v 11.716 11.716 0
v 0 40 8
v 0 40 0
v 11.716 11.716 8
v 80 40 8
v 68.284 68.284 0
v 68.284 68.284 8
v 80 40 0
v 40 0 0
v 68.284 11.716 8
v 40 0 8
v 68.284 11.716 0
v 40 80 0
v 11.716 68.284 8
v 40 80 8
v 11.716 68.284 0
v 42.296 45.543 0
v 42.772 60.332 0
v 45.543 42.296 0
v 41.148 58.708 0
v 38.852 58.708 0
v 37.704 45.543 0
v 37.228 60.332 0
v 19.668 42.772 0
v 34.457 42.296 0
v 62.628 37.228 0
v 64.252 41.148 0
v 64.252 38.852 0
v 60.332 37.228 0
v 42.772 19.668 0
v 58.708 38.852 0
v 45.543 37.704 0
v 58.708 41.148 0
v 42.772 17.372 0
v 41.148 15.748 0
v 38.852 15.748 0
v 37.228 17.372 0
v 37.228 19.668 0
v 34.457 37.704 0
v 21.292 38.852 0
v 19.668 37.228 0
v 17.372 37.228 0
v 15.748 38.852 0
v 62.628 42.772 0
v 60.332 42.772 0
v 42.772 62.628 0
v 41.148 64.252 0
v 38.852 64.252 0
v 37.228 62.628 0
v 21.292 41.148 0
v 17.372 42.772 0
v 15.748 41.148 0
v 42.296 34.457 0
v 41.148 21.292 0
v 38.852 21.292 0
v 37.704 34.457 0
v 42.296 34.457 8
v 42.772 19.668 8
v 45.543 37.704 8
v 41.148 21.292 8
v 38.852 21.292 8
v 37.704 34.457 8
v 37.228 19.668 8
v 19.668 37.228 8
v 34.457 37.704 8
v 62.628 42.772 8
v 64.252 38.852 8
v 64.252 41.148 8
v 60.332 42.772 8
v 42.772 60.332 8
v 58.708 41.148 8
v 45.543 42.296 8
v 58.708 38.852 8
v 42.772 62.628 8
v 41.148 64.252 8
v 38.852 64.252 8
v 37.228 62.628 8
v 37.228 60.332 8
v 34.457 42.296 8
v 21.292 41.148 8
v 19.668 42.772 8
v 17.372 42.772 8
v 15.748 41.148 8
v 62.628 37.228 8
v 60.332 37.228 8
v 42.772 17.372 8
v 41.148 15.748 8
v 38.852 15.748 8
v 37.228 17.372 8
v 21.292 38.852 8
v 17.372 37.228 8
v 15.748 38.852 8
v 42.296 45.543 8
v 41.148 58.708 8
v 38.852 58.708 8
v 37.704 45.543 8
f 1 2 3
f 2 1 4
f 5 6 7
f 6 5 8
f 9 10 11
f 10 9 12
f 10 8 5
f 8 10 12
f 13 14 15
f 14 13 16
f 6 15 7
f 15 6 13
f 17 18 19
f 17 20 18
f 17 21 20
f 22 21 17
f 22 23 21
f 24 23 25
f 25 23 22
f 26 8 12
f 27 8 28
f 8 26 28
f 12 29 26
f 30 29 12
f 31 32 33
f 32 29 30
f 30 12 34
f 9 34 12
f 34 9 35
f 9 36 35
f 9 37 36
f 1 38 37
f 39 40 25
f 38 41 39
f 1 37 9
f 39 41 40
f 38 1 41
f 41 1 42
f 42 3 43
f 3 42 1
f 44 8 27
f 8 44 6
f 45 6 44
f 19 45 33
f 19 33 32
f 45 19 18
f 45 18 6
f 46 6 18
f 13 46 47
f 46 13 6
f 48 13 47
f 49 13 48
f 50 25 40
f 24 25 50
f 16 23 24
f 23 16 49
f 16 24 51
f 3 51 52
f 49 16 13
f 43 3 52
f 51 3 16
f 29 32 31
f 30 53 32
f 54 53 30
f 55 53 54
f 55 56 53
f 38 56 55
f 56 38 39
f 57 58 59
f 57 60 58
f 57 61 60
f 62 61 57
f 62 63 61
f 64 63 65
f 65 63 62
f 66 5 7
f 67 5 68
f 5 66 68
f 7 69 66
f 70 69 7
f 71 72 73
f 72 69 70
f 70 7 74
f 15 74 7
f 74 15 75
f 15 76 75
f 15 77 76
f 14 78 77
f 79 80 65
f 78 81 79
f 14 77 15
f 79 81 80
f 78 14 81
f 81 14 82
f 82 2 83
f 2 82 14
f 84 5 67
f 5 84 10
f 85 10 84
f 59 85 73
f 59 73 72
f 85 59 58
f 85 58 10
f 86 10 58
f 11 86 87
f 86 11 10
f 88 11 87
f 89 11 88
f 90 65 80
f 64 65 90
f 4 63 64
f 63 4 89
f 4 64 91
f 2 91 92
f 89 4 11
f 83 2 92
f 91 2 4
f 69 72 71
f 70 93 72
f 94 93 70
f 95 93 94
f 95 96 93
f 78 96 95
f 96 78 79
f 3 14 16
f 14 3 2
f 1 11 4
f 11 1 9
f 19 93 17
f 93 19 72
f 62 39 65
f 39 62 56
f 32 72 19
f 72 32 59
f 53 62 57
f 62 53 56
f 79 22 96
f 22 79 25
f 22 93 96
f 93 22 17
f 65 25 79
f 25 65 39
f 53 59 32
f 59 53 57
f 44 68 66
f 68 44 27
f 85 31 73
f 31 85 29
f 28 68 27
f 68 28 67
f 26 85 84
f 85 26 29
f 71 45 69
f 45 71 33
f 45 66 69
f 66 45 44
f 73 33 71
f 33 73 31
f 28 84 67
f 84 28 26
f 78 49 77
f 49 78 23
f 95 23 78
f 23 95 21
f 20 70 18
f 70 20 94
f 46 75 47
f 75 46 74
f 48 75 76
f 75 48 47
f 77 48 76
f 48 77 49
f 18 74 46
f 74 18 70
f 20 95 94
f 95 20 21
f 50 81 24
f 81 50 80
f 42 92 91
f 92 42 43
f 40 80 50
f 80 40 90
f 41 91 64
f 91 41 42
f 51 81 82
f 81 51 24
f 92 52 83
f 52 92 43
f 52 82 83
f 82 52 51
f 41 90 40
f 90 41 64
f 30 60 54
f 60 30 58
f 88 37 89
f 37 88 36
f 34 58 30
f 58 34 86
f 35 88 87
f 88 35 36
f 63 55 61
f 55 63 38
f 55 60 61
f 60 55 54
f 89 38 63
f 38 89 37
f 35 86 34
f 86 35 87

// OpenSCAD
$fn = 32;

// ----------------------------------------------------------------------
// Polygon plate: 8-gon R40, 4 bolt windows
// ----------------------------------------------------------------------

// --- parameters (mm) ---
sides = 8;                // number of polygon sides
plate_r = 40;             // circumscribed radius of the polygon
bore_r = 6;               // centre bore radius
bolts = 4;                // number of bolt windows
ring_r = 21.48;           // bolt-circle radius
bolt_r = 3;               // bolt window radius
plate_t = 8;              // plate thickness, Z (extrusion height)
fit_tol = 0.05;           // declared fit tolerance (prompt contract)
free_tol = 0.3;           // declared free tolerance (prompt contract)

plate_d = 2 * plate_r;  // circumscribed diameter
bore_d = 2 * bore_r;  // centre bore diameter
bolt_d = 2 * bolt_r;  // bolt window diameter
ring_d = 2 * ring_r;  // bolt-circle diameter

profile = [[80, 40], [68.284, 68.284], [40, 80], [11.716, 68.284], [0, 40], [11.716, 11.716], [40, 0], [68.284, 11.716]];  // primary outline, 8 points, counter clockwise
void_1 = [[45.543, 42.296], [42.296, 45.543], [37.704, 45.543], [34.457, 42.296], [34.457, 37.704], [37.704, 34.457], [42.296, 34.457], [45.543, 37.704]];  // centre bore, 8 points
void_2 = [[64.252, 41.148], [62.628, 42.772], [60.332, 42.772], [58.708, 41.148], [58.708, 38.852], [60.332, 37.228], [62.628, 37.228], [64.252, 38.852]];  // bolt window 1, 8 points
void_3 = [[42.772, 62.628], [41.148, 64.252], [38.852, 64.252], [37.228, 62.628], [37.228, 60.332], [38.852, 58.708], [41.148, 58.708], [42.772, 60.332]];  // bolt window 2, 8 points
void_4 = [[21.292, 41.148], [19.668, 42.772], [17.372, 42.772], [15.748, 41.148], [15.748, 38.852], [17.372, 37.228], [19.668, 37.228], [21.292, 38.852]];  // bolt window 3, 8 points
void_5 = [[42.772, 19.668], [41.148, 21.292], [38.852, 21.292], [37.228, 19.668], [37.228, 17.372], [38.852, 15.748], [41.148, 15.748], [42.772, 17.372]];  // bolt window 4, 8 points

// --- the one profile operation ---
difference() {
  linear_extrude(height = plate_t) polygon(points = profile);
  translate([0, 0, -1])
    linear_extrude(height = plate_t + 2) polygon(points = void_1);
  translate([0, 0, -1])
    linear_extrude(height = plate_t + 2) polygon(points = void_2);
  translate([0, 0, -1])
    linear_extrude(height = plate_t + 2) polygon(points = void_3);
  translate([0, 0, -1])
    linear_extrude(height = plate_t + 2) polygon(points = void_4);
  translate([0, 0, -1])
    linear_extrude(height = plate_t + 2) polygon(points = void_5);
}
